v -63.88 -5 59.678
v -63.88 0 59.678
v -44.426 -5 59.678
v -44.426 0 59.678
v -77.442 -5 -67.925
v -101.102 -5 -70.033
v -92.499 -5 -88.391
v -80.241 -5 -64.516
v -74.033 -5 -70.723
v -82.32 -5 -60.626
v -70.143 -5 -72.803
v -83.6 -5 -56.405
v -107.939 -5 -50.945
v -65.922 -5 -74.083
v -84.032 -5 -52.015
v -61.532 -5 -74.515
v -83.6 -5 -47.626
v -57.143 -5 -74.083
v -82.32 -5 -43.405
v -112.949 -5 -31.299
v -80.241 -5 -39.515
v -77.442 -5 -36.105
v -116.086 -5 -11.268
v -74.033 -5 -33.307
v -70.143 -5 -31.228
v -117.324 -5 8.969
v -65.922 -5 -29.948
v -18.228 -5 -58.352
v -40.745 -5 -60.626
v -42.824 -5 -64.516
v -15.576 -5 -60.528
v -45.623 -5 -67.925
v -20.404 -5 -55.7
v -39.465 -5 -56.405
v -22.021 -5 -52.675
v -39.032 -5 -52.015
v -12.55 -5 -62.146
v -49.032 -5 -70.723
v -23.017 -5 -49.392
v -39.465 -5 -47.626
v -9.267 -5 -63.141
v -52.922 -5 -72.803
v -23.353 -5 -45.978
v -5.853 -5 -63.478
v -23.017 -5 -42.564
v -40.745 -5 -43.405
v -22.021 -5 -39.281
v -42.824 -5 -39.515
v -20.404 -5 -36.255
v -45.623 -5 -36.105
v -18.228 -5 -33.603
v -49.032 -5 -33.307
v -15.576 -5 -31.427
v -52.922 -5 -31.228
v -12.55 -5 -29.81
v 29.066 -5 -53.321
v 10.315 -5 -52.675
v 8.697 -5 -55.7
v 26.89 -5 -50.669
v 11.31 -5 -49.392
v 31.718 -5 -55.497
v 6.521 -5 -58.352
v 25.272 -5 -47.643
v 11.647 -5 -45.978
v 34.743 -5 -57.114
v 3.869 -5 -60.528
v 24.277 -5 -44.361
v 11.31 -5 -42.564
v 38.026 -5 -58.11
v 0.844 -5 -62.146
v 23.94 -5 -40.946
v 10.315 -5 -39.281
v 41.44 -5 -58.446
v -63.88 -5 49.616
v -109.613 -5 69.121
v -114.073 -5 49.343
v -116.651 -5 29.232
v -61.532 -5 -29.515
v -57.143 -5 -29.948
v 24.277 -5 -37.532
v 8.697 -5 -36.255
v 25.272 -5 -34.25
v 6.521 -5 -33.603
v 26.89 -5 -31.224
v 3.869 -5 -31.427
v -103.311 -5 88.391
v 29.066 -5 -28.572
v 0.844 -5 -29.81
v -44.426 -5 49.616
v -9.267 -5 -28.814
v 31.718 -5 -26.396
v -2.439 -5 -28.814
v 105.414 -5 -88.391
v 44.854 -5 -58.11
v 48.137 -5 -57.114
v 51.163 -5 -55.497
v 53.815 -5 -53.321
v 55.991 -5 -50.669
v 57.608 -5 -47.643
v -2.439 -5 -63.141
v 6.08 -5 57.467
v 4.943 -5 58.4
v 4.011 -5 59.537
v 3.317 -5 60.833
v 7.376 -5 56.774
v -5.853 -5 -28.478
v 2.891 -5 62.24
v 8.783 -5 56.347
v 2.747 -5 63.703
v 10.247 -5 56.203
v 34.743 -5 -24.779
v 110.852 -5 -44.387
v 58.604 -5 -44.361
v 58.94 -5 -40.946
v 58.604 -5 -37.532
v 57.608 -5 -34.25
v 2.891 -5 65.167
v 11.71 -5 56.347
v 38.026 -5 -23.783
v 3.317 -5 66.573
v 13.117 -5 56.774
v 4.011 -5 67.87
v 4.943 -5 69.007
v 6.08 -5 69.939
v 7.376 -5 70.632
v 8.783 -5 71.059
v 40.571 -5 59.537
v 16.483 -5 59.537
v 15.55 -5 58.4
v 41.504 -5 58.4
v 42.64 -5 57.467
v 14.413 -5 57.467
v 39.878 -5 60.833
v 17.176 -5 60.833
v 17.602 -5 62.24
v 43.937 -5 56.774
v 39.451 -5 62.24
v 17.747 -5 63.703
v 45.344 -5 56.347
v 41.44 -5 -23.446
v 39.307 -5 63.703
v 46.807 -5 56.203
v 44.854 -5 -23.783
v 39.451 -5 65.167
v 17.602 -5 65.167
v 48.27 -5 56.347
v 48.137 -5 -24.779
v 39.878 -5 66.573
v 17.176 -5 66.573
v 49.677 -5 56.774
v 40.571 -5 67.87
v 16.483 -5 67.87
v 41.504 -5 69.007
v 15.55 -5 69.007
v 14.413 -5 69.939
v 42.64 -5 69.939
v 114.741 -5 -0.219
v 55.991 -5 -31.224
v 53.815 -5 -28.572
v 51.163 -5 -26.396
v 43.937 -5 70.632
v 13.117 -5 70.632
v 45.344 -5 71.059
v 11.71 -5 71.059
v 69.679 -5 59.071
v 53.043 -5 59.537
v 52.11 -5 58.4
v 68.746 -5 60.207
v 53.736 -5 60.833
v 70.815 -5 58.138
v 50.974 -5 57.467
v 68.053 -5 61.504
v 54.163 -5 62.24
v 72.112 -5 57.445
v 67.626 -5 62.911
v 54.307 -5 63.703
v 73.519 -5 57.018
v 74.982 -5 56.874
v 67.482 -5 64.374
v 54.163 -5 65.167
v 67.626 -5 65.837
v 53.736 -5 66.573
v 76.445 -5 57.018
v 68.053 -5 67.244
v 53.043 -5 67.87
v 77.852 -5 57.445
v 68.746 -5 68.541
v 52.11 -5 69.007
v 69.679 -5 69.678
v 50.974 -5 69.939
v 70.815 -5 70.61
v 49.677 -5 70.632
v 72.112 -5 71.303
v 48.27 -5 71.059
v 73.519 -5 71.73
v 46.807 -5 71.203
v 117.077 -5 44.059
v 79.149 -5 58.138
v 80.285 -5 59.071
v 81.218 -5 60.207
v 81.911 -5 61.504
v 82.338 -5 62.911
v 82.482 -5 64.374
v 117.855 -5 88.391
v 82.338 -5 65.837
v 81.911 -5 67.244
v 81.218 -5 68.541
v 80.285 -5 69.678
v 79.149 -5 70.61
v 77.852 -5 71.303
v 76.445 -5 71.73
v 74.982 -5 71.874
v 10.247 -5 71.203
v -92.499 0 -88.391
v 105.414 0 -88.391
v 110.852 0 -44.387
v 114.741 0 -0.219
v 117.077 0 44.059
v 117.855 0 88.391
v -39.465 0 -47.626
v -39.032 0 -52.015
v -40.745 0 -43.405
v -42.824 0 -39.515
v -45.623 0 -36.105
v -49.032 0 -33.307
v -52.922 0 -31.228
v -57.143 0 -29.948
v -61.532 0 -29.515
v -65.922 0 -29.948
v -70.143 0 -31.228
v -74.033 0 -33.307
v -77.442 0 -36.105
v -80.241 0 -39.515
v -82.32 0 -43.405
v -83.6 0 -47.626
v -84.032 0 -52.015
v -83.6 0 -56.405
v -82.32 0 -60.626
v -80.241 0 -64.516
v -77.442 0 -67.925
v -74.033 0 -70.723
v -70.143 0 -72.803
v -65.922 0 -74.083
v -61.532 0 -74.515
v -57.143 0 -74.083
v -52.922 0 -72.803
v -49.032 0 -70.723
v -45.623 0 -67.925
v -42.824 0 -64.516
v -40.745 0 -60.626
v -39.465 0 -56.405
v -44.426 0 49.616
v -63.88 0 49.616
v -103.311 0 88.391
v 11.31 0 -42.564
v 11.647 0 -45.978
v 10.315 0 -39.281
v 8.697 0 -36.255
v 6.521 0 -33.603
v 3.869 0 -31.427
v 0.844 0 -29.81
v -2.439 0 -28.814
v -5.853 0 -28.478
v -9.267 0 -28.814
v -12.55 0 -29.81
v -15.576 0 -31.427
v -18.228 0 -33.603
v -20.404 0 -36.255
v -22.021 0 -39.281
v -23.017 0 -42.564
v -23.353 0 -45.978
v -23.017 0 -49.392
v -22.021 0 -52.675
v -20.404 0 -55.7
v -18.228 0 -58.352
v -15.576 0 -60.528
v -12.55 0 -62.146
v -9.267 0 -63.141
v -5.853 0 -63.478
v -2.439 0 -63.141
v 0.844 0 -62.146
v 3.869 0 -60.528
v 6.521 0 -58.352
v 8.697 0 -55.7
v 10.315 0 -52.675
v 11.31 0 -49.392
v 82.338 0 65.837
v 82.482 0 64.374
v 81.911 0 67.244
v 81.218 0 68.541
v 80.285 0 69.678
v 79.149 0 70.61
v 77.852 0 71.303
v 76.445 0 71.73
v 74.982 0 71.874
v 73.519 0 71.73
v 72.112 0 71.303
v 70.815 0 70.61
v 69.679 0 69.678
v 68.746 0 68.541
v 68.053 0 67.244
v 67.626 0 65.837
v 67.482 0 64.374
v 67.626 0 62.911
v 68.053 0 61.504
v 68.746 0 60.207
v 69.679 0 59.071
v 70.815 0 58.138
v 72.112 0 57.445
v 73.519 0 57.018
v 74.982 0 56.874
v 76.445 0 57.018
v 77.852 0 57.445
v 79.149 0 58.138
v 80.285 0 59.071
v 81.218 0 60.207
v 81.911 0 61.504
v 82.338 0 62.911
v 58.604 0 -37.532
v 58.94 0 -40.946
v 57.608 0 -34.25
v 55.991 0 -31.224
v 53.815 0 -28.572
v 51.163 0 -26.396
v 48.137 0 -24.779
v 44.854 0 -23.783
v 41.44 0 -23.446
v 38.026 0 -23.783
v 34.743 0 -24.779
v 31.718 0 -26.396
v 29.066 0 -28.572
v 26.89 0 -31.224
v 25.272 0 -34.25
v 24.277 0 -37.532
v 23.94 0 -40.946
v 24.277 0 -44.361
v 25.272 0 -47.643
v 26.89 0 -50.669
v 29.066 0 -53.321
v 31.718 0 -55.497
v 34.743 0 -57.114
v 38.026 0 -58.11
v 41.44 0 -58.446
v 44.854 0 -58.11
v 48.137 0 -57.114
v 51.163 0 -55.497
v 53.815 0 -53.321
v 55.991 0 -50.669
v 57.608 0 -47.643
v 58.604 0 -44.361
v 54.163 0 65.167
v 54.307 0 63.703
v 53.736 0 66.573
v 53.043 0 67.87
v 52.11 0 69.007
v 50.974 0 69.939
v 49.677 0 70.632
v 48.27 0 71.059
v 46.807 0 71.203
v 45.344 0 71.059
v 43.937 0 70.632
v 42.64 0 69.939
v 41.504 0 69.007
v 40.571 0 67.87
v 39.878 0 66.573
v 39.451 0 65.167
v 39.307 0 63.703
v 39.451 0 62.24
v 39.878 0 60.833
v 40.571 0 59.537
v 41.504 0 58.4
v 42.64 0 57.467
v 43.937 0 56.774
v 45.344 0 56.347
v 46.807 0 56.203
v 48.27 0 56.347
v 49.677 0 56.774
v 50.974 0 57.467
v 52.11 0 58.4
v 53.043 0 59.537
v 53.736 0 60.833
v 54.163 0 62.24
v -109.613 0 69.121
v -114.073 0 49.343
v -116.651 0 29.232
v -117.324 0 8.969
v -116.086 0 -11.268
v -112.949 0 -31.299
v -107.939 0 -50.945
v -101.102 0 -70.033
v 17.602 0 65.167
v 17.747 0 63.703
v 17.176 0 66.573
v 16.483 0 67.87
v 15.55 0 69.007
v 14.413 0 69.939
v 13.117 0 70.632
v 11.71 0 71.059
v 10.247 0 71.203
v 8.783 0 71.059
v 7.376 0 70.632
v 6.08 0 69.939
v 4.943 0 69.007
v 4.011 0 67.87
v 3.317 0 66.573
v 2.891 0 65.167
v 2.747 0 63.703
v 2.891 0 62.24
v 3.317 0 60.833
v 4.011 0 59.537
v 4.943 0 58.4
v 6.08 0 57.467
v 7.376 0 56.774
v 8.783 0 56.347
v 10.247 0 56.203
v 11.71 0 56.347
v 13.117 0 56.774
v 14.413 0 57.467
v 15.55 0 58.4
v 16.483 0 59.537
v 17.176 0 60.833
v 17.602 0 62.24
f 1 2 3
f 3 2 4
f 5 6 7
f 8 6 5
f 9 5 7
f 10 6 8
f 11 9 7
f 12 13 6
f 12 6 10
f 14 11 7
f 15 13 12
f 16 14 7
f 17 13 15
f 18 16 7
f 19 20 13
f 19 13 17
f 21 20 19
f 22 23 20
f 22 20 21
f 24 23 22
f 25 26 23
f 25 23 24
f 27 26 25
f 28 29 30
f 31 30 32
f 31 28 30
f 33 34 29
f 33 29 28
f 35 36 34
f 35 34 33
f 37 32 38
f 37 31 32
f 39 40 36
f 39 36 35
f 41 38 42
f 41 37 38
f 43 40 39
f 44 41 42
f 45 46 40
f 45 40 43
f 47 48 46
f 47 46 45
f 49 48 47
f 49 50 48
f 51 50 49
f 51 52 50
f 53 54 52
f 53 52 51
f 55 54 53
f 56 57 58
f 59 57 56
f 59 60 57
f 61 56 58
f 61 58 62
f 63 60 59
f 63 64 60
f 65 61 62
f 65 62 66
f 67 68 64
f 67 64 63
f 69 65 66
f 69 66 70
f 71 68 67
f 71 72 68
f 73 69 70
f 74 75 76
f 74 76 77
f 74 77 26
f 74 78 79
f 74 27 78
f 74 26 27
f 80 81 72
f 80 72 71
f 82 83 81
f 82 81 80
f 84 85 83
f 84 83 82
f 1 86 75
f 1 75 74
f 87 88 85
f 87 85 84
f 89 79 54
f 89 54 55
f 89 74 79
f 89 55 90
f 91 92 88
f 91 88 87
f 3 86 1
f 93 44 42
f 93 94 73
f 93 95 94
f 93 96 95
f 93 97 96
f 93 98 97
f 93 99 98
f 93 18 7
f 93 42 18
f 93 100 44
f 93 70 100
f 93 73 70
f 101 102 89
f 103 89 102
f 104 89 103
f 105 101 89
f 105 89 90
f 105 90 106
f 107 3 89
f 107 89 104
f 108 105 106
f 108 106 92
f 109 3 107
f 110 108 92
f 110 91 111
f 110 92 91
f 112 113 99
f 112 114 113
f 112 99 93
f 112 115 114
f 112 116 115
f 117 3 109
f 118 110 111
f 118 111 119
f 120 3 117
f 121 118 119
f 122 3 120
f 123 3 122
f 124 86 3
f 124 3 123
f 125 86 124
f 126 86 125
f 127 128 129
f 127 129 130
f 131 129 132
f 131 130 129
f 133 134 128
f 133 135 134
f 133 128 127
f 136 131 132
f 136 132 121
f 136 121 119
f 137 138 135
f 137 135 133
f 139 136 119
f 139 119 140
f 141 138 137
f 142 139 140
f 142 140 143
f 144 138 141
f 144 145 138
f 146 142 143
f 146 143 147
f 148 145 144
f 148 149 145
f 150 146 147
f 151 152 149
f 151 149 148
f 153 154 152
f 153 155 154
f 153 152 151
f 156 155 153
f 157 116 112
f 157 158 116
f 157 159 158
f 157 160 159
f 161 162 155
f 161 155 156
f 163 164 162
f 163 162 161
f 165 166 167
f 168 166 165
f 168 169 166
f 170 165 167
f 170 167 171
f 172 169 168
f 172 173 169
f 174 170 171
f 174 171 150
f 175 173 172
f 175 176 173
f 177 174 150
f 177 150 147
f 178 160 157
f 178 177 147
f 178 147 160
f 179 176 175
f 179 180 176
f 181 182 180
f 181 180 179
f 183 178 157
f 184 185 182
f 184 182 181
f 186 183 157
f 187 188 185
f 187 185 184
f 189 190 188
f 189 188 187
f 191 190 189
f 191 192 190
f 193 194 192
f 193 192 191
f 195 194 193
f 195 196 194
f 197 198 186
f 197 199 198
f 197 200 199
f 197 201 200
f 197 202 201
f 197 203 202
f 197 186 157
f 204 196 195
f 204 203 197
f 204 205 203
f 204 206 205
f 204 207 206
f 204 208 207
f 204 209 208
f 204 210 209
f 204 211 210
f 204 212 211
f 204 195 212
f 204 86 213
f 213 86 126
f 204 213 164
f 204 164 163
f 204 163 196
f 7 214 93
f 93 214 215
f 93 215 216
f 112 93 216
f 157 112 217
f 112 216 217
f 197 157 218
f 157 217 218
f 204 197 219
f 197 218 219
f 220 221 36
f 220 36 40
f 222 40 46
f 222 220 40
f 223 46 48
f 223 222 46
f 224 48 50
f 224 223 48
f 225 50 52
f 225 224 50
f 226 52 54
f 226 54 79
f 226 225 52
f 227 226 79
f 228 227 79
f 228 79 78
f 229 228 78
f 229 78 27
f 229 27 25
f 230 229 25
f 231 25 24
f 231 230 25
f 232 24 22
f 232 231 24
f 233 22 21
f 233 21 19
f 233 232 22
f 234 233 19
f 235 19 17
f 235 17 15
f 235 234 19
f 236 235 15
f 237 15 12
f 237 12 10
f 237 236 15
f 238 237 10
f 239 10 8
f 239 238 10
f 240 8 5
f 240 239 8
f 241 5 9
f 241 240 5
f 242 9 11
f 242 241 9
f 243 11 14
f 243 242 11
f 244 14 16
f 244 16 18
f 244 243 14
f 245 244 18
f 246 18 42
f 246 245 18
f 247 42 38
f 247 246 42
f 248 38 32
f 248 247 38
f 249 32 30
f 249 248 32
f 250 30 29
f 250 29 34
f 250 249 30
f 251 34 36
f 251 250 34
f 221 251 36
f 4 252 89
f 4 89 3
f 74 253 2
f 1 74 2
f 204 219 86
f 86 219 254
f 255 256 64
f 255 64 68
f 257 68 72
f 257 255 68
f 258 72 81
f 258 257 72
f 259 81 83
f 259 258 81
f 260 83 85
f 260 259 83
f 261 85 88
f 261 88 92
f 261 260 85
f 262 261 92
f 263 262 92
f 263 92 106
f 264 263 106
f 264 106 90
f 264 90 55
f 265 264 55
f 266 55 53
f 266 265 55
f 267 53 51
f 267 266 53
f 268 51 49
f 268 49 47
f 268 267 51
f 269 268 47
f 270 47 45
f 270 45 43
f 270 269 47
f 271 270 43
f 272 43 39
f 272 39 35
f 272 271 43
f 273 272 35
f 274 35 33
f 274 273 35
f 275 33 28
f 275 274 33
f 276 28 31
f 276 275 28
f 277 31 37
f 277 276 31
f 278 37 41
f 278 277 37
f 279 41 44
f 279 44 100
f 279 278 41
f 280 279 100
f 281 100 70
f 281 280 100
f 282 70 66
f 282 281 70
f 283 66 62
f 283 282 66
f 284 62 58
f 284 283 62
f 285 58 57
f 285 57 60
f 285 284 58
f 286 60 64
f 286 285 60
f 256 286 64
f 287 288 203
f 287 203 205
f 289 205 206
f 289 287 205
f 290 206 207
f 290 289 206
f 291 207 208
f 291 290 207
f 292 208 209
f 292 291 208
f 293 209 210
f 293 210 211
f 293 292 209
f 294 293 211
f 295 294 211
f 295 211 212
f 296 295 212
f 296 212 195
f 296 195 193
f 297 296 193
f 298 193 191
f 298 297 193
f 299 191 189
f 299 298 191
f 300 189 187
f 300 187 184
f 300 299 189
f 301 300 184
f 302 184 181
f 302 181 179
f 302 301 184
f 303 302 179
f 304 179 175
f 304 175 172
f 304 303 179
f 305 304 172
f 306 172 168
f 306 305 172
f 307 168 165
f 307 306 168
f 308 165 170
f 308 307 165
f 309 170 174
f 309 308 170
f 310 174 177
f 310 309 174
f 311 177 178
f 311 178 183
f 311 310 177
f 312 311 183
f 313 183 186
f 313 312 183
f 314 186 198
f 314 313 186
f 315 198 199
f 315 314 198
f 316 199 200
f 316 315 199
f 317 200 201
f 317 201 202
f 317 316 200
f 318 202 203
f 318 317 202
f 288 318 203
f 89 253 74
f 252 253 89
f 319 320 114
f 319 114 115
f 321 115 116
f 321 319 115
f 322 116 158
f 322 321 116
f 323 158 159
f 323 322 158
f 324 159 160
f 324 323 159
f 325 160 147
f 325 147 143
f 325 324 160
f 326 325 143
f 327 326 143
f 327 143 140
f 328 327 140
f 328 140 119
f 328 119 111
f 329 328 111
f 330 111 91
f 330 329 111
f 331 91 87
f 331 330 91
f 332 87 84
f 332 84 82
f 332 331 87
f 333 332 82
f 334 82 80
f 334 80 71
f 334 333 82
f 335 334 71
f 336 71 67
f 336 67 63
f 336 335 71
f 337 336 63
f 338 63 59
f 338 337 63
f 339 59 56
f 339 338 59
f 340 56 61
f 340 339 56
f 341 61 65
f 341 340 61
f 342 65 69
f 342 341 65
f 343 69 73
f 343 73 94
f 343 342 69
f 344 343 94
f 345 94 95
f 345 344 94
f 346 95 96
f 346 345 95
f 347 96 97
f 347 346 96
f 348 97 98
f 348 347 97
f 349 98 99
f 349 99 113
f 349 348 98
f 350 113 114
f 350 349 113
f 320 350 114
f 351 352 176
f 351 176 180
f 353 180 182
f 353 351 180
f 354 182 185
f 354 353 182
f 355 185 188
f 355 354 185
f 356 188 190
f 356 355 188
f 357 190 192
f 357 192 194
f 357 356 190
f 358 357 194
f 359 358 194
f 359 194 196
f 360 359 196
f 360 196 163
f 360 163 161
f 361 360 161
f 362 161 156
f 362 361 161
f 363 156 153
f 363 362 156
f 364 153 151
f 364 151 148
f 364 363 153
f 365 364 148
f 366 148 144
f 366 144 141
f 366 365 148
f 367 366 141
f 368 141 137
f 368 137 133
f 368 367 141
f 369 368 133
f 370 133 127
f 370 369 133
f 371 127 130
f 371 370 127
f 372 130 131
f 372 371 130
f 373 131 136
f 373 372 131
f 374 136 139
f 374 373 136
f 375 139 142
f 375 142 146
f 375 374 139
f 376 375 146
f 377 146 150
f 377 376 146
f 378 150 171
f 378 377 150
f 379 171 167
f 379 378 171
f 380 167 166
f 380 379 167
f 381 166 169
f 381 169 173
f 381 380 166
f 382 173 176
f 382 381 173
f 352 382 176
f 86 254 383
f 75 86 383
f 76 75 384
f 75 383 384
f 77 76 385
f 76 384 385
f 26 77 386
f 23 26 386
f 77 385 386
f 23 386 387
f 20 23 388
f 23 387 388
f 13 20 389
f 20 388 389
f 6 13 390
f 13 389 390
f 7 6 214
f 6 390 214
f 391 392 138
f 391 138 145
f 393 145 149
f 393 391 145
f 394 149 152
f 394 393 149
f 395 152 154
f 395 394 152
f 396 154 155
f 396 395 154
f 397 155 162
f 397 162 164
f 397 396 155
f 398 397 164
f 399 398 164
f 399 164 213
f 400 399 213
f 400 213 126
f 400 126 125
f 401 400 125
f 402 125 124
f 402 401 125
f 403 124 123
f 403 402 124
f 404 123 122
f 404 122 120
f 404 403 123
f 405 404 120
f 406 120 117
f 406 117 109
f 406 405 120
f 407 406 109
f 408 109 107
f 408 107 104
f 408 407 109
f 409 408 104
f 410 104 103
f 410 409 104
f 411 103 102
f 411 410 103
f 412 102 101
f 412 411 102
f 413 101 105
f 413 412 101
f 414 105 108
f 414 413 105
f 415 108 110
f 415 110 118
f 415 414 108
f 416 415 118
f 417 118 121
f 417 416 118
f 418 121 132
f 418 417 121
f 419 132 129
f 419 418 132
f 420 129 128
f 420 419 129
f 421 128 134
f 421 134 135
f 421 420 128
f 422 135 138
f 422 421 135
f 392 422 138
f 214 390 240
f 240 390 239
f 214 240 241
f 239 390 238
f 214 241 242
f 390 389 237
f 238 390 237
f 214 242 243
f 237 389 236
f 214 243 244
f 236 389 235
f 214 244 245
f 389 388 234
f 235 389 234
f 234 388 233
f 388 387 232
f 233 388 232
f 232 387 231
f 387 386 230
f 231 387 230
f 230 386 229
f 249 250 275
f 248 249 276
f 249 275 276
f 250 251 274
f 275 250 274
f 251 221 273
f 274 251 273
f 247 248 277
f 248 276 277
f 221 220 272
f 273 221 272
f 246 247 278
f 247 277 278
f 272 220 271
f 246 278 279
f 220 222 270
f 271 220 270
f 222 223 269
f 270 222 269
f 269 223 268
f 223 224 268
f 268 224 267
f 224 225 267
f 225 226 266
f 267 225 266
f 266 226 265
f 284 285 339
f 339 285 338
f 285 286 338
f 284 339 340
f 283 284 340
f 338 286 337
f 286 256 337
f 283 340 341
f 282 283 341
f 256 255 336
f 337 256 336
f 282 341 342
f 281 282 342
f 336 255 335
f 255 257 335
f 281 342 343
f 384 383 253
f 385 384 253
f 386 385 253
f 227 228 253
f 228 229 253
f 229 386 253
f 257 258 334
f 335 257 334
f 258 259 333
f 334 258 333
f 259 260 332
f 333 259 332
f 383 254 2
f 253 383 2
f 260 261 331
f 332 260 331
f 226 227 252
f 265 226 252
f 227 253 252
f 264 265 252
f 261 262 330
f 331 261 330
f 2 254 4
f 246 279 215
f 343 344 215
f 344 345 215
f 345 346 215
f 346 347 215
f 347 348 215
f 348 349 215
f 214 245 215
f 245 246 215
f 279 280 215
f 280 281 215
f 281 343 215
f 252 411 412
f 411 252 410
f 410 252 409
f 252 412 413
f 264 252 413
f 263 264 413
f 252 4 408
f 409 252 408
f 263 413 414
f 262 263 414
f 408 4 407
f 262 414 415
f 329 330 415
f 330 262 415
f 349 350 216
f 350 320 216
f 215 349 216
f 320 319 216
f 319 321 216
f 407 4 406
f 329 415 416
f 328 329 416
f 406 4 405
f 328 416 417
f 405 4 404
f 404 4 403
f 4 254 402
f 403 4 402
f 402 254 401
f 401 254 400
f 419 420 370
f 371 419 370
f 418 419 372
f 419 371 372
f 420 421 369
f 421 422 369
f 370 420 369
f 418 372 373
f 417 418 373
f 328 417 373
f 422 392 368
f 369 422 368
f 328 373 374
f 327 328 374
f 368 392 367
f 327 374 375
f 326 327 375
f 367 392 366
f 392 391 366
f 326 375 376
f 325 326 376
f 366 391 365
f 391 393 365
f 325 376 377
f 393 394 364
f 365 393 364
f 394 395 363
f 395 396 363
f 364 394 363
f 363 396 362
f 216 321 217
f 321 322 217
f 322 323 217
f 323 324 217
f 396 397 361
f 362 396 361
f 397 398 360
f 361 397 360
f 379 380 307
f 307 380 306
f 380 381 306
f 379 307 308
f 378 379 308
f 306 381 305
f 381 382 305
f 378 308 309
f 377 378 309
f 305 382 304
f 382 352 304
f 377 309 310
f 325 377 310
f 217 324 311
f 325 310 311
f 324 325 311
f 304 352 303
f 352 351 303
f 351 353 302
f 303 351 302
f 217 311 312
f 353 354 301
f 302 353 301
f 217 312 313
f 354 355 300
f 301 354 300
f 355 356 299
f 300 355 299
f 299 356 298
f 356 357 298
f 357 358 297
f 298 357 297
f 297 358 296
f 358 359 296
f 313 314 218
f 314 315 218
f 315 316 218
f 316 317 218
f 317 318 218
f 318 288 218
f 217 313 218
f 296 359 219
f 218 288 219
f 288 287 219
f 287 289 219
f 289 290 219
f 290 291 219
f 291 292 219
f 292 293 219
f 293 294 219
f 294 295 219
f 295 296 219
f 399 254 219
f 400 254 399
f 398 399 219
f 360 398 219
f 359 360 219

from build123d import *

# Parameters (mm, degrees)
F0_R     = 22.5
F0_R_2   = 17.5
F0_W     = 19.454152
F0_H     = 10.062493
F0_R_3   = 7.5
F1_DEPTH = 5


with BuildPart() as f1:
    # F0 (on Front) → F1 (new body)
    with BuildSketch(Plane.XZ):
        with BuildLine():
            Line((-92.498694, -88.391484), (105.413623, -88.391484))
            ThreePointArc((105.413623, -88.391484), (114.741048, -0.218636), (117.855312, 88.391484))
            Line((117.855312, 88.391484), (-103.311009, 88.391484))
            ThreePointArc((-103.311009, 88.391484), (-116.943778, -1.16445), (-92.498694, -88.391484))
        make_face()
        with Locations((-61.532475, -52.015223)):
            Circle(F0_R, mode=Mode.SUBTRACT)
        with Locations((-5.853384, -45.977734)):
            Circle(F0_R_2, mode=Mode.SUBTRACT)
        with Locations((41.440301, -40.946487)):
            Circle(F0_R_2, mode=Mode.SUBTRACT)
        with Locations((-54.153323, 54.64714)):
            Rectangle(F0_W, F0_H, mode=Mode.SUBTRACT)
        with Locations((10.246594, 63.703366)):
            Circle(F0_R_3, mode=Mode.SUBTRACT)
        with Locations((46.806965, 63.703366)):
            Circle(F0_R_3, mode=Mode.SUBTRACT)
        with Locations((74.981928, 64.374208)):
            Circle(F0_R_3, mode=Mode.SUBTRACT)
    extrude(amount=F1_DEPTH)


solid = f1.part
